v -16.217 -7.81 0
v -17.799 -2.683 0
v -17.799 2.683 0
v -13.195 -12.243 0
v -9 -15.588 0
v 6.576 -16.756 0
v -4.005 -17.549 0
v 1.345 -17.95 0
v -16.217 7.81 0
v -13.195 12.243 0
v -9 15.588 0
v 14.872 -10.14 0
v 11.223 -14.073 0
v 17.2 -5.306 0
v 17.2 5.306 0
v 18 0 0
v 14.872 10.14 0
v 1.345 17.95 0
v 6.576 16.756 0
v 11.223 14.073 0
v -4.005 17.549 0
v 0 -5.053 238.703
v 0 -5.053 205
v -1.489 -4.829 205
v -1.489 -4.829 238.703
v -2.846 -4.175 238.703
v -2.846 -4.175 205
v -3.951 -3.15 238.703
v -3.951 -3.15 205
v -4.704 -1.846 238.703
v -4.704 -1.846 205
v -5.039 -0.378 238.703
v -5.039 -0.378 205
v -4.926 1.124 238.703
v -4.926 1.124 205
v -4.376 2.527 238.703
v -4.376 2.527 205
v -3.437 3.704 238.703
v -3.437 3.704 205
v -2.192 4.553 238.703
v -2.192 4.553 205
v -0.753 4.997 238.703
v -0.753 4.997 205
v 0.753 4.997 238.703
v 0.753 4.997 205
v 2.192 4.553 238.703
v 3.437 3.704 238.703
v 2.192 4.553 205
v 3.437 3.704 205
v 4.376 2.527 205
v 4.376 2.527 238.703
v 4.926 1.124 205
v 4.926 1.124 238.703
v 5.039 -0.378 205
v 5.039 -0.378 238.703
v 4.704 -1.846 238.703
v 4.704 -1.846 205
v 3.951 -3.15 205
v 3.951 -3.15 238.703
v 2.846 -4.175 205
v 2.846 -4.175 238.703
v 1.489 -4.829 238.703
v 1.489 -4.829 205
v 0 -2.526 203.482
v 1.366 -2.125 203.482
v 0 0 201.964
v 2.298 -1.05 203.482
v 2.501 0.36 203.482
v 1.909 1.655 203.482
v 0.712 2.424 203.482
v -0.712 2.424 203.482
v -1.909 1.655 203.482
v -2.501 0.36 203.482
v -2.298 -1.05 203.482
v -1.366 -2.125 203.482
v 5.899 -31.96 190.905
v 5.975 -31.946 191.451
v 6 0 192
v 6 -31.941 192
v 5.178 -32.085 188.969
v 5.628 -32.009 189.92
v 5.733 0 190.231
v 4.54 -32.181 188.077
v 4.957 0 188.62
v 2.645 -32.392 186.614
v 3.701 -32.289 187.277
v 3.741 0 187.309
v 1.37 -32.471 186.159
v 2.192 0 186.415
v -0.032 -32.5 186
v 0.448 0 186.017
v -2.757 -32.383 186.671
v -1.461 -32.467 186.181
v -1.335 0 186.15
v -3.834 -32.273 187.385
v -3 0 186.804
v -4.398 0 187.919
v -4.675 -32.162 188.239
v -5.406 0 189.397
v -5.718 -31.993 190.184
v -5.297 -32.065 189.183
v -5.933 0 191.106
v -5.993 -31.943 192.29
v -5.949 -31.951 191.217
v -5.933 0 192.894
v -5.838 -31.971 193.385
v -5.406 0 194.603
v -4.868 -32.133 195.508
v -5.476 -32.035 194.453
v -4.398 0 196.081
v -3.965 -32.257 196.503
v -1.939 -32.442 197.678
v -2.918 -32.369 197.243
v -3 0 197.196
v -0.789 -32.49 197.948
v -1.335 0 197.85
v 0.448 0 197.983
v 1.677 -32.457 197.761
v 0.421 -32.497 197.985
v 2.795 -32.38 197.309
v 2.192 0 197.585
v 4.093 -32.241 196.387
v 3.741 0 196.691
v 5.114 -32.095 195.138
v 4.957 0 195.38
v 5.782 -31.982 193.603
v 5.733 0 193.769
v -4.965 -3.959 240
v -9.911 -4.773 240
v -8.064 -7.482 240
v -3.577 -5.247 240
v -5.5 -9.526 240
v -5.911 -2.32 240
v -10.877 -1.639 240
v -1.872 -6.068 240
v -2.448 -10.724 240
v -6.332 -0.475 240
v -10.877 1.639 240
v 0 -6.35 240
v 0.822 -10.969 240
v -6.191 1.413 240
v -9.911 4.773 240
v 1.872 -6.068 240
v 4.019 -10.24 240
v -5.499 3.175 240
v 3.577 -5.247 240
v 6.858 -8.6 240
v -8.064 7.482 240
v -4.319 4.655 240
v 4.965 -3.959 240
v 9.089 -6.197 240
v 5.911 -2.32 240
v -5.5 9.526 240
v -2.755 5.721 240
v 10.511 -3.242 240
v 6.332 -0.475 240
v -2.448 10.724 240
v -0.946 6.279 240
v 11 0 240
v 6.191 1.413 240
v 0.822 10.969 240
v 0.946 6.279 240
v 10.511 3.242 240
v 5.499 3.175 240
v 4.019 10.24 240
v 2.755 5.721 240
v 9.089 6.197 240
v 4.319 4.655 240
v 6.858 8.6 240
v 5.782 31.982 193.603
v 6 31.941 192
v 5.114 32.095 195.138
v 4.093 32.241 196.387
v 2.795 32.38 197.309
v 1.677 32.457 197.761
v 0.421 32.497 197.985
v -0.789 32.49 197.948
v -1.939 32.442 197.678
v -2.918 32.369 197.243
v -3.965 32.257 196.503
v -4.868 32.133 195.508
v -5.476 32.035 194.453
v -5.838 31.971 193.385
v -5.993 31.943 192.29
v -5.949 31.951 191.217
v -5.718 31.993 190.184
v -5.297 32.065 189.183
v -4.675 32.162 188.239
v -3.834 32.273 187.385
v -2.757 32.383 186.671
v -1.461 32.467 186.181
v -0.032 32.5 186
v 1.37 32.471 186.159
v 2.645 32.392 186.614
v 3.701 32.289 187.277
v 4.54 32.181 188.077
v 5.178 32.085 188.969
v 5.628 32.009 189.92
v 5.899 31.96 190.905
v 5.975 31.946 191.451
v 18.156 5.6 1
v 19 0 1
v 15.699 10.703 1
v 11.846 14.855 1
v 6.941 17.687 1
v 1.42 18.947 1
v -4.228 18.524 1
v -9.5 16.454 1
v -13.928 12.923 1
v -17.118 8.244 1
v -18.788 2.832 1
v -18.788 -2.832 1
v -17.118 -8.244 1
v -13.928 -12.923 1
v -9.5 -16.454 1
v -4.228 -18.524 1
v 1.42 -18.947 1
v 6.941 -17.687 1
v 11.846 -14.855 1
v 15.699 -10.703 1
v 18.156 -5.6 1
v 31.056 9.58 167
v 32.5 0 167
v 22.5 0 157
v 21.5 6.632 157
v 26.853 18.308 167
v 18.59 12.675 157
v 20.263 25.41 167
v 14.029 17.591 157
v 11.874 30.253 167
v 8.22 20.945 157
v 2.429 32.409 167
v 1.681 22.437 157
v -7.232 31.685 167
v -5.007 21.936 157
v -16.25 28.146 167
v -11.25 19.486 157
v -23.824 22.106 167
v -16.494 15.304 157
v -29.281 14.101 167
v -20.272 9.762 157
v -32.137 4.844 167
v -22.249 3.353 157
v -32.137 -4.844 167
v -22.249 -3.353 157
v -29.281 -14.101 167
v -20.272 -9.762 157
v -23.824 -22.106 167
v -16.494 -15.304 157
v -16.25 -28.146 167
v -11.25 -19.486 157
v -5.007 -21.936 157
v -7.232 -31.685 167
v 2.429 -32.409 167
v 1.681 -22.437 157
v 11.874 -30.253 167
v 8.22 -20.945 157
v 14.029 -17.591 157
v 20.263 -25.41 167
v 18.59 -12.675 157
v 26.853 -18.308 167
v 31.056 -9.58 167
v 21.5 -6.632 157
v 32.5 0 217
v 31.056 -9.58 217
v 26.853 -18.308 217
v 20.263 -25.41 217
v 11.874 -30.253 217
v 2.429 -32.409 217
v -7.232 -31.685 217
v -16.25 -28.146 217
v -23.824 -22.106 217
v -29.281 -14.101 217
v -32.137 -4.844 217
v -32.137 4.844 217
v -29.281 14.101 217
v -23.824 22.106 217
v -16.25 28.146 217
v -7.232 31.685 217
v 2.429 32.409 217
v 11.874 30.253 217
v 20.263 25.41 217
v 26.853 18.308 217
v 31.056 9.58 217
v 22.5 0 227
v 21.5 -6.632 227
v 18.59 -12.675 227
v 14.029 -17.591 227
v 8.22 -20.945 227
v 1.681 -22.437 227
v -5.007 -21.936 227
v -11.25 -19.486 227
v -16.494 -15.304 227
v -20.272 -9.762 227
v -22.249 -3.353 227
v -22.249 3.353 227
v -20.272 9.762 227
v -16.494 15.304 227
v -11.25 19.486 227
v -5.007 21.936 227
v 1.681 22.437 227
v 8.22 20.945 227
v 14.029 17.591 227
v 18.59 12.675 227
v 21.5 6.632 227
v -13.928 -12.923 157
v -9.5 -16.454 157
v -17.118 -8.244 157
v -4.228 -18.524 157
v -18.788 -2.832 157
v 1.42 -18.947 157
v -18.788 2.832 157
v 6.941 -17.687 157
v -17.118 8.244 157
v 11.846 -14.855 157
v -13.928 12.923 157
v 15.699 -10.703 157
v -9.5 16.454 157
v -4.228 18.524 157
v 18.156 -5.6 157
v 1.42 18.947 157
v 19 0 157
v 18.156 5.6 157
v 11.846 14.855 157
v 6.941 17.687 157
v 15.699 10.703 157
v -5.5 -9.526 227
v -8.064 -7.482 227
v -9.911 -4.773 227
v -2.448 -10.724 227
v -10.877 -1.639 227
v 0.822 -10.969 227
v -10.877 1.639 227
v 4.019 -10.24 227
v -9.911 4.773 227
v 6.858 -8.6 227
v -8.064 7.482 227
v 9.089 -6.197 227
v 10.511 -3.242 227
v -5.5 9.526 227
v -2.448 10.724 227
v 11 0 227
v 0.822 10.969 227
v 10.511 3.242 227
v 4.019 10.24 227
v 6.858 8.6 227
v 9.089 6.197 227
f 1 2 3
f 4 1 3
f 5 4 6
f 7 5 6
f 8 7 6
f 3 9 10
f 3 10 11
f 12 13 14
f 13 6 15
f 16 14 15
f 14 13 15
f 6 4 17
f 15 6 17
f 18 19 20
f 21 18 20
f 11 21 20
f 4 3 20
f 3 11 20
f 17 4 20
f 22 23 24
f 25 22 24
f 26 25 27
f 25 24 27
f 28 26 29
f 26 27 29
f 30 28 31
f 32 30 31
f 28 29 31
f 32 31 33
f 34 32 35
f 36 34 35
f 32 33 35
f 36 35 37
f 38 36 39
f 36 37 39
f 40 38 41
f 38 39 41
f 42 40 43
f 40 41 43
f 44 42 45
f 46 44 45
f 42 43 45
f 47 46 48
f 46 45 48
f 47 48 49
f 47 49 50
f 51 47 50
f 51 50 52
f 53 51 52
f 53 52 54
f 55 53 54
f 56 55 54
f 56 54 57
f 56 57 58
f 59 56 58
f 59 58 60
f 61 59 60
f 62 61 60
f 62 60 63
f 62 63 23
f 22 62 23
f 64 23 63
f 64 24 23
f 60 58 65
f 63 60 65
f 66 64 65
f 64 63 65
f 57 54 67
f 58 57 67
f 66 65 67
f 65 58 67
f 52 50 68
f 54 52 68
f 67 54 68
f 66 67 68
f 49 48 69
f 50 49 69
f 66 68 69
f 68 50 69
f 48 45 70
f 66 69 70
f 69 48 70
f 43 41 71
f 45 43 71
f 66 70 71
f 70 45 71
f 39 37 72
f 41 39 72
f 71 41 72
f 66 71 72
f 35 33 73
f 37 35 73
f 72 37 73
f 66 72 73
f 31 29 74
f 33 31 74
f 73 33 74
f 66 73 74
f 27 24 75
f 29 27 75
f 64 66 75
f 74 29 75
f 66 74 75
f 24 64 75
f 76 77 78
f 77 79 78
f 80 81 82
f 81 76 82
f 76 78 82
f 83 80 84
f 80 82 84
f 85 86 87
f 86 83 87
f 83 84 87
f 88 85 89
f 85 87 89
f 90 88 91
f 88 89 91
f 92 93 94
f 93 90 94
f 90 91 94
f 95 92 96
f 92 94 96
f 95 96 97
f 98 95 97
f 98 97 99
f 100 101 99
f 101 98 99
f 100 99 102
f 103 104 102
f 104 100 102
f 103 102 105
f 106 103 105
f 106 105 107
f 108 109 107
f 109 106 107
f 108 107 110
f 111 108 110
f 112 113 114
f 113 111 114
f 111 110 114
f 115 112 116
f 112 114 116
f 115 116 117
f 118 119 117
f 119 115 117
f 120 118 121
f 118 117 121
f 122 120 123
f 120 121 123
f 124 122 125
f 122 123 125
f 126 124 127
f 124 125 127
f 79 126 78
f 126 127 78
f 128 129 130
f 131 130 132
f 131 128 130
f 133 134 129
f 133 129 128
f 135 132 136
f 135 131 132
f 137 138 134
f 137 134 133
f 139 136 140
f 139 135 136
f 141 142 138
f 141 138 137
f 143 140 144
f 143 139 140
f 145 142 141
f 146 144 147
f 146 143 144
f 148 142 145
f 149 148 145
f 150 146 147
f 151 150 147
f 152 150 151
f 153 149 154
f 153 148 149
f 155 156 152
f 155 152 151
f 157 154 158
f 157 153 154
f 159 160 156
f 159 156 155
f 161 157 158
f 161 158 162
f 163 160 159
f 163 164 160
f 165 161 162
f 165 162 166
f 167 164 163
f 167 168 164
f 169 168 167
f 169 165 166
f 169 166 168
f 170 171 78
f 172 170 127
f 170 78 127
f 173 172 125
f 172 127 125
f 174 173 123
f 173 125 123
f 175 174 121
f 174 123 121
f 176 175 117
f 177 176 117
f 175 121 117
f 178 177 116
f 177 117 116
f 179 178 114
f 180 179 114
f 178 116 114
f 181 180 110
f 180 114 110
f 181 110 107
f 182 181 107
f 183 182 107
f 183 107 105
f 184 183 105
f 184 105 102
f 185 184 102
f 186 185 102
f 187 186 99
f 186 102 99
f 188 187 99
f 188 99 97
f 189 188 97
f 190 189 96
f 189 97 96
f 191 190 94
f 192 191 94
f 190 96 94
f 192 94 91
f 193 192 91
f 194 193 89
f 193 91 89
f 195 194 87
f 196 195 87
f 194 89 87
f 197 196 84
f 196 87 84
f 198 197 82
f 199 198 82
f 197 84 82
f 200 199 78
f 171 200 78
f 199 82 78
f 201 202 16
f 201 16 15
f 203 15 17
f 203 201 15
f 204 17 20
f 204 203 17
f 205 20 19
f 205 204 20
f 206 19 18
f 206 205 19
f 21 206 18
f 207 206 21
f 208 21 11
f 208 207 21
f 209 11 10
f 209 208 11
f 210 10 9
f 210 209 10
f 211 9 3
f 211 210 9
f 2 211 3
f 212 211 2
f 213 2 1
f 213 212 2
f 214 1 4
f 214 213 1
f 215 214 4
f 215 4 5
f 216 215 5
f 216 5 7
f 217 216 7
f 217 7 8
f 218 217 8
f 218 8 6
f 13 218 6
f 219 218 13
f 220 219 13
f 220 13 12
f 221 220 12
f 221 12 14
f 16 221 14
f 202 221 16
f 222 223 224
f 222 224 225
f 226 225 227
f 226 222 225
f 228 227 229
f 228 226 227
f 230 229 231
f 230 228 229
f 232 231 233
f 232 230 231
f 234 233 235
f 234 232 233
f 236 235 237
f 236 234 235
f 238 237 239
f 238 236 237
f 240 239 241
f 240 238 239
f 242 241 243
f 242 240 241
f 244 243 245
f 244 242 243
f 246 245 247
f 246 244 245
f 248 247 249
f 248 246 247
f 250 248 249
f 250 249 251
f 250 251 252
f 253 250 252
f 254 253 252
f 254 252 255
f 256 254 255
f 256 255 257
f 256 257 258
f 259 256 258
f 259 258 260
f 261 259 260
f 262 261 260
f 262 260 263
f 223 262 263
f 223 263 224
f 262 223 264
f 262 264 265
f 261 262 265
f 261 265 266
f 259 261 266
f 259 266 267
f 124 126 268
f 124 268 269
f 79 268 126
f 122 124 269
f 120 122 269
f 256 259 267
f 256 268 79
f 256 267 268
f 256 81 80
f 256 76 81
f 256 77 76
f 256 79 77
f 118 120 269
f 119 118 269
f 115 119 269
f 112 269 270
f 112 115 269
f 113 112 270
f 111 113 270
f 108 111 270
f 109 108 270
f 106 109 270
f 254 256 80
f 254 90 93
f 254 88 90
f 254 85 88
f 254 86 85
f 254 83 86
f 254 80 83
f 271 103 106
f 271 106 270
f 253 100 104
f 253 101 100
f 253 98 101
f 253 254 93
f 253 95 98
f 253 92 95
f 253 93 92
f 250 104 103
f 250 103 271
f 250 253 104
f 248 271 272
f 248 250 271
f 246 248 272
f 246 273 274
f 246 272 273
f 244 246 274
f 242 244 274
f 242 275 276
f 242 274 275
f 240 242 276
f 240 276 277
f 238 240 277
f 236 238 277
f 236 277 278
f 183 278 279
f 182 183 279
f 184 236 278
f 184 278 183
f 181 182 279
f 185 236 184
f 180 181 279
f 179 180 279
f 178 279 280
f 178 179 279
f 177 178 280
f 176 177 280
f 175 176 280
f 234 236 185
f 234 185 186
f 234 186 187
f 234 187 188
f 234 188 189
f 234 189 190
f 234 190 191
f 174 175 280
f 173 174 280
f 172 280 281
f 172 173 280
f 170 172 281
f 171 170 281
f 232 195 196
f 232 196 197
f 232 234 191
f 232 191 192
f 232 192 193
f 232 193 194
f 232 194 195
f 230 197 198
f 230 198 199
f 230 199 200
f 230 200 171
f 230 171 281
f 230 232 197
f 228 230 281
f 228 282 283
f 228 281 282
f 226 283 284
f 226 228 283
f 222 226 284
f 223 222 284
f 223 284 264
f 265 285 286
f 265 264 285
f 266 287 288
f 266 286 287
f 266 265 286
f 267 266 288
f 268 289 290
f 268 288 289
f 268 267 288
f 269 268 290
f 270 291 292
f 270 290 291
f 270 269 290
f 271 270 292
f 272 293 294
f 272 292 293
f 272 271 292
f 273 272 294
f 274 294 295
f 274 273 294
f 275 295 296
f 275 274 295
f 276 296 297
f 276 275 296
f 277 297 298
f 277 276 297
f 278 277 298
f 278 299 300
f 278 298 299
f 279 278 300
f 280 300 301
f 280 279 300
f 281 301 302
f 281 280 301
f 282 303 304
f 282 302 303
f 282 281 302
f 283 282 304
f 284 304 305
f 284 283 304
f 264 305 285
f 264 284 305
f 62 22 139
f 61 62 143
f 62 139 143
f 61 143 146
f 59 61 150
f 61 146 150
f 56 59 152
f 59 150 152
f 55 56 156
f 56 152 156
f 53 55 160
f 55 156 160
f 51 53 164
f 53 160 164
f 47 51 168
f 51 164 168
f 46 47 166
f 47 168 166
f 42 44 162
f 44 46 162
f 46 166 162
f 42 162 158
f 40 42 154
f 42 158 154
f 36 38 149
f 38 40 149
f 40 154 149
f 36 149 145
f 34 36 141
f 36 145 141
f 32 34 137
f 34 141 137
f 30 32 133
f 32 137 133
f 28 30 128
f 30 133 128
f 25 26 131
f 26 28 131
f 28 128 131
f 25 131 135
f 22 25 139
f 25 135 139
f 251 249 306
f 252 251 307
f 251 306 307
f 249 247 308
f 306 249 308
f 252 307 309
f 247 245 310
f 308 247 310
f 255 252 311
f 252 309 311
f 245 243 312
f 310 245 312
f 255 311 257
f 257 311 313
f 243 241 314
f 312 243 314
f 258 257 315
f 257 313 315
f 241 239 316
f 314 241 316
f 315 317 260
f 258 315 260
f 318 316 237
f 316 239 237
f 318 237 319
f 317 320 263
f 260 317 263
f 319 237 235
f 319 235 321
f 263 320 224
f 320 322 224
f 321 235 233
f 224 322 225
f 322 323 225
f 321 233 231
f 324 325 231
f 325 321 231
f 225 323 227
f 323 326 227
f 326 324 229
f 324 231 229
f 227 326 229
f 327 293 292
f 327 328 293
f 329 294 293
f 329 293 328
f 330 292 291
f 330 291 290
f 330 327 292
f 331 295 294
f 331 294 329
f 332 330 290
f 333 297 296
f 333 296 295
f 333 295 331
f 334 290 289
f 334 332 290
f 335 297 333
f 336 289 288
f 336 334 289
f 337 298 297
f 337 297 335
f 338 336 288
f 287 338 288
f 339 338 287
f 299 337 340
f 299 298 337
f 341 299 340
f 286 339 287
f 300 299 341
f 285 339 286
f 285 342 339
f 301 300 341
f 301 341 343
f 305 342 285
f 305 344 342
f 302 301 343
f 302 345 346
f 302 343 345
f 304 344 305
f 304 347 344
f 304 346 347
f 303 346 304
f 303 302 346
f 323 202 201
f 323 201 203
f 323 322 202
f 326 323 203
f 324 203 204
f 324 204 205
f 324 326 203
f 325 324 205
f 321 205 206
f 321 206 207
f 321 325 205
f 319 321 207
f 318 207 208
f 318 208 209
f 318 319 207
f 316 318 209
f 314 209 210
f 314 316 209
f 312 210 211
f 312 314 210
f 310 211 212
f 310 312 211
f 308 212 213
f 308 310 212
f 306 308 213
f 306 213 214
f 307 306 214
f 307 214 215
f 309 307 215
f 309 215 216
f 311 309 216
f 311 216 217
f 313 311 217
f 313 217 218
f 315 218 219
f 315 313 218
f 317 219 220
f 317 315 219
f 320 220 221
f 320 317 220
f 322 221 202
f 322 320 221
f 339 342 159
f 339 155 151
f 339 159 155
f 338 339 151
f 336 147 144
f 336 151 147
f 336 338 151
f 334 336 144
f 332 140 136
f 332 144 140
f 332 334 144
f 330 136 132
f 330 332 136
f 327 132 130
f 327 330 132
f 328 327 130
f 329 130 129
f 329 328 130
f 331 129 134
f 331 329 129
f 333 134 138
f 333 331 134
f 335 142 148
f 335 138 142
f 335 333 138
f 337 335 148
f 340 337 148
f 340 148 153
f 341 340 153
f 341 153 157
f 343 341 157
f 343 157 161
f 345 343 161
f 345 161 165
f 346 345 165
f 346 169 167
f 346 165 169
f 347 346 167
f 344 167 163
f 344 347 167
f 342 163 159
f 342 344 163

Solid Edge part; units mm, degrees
sketch "Sketch1" plane through (0, 0, 0) normal (0, -1, 0) x (1, 0, 0)
  line L0 (0, 240) -> (11, 240)
  line L1 (11, 240) -> (11, 227)
  line L2 (11, 227) -> (32.5, 227)
  line L3 (32.5, 227) -> (32.5, 157)
  line L4 (32.5, 157) -> (19, 157)
  line L5 (19, 0) -> (19, 157)
  line L6 (0, 0) -> (19, 0)
revolve "RevolvedProtrusion1" add sketch "Sketch1" angle 360 about axis through (0, 0, 0) along (0, 0, 1)
chamfer "Chamfer1" distance 10 angle 45 2 edges at (-32.5, 0, 227) (-32.5, 0, 157)
cosmetic_thread "Thread_1" size "Tr 38 x 10" thread depth 154
chamfer "Chamfer_2" distance 1 angle 45 1 edges at (-19, 0, 0)
sketch "Sketch2" plane through (0, 0, 0) normal (0, -1, 0) x (1, 0, 0)
  circle A0 centre (0, 192) radius 6
  dimension "D1" = 35
extrude "ExtrudedCutout_1" cut sketch "Sketch2" along normal mid plane 191.2214
hole "Hole_1" at (0, 0, 240) direction (0, 0, -1) diameter 10.106 depth 35 tip angle 118 countersink diameter 12.7 countersink angle 90 thread major 12 thread length 30
properties part number "3" material "Fe - 410 W"
